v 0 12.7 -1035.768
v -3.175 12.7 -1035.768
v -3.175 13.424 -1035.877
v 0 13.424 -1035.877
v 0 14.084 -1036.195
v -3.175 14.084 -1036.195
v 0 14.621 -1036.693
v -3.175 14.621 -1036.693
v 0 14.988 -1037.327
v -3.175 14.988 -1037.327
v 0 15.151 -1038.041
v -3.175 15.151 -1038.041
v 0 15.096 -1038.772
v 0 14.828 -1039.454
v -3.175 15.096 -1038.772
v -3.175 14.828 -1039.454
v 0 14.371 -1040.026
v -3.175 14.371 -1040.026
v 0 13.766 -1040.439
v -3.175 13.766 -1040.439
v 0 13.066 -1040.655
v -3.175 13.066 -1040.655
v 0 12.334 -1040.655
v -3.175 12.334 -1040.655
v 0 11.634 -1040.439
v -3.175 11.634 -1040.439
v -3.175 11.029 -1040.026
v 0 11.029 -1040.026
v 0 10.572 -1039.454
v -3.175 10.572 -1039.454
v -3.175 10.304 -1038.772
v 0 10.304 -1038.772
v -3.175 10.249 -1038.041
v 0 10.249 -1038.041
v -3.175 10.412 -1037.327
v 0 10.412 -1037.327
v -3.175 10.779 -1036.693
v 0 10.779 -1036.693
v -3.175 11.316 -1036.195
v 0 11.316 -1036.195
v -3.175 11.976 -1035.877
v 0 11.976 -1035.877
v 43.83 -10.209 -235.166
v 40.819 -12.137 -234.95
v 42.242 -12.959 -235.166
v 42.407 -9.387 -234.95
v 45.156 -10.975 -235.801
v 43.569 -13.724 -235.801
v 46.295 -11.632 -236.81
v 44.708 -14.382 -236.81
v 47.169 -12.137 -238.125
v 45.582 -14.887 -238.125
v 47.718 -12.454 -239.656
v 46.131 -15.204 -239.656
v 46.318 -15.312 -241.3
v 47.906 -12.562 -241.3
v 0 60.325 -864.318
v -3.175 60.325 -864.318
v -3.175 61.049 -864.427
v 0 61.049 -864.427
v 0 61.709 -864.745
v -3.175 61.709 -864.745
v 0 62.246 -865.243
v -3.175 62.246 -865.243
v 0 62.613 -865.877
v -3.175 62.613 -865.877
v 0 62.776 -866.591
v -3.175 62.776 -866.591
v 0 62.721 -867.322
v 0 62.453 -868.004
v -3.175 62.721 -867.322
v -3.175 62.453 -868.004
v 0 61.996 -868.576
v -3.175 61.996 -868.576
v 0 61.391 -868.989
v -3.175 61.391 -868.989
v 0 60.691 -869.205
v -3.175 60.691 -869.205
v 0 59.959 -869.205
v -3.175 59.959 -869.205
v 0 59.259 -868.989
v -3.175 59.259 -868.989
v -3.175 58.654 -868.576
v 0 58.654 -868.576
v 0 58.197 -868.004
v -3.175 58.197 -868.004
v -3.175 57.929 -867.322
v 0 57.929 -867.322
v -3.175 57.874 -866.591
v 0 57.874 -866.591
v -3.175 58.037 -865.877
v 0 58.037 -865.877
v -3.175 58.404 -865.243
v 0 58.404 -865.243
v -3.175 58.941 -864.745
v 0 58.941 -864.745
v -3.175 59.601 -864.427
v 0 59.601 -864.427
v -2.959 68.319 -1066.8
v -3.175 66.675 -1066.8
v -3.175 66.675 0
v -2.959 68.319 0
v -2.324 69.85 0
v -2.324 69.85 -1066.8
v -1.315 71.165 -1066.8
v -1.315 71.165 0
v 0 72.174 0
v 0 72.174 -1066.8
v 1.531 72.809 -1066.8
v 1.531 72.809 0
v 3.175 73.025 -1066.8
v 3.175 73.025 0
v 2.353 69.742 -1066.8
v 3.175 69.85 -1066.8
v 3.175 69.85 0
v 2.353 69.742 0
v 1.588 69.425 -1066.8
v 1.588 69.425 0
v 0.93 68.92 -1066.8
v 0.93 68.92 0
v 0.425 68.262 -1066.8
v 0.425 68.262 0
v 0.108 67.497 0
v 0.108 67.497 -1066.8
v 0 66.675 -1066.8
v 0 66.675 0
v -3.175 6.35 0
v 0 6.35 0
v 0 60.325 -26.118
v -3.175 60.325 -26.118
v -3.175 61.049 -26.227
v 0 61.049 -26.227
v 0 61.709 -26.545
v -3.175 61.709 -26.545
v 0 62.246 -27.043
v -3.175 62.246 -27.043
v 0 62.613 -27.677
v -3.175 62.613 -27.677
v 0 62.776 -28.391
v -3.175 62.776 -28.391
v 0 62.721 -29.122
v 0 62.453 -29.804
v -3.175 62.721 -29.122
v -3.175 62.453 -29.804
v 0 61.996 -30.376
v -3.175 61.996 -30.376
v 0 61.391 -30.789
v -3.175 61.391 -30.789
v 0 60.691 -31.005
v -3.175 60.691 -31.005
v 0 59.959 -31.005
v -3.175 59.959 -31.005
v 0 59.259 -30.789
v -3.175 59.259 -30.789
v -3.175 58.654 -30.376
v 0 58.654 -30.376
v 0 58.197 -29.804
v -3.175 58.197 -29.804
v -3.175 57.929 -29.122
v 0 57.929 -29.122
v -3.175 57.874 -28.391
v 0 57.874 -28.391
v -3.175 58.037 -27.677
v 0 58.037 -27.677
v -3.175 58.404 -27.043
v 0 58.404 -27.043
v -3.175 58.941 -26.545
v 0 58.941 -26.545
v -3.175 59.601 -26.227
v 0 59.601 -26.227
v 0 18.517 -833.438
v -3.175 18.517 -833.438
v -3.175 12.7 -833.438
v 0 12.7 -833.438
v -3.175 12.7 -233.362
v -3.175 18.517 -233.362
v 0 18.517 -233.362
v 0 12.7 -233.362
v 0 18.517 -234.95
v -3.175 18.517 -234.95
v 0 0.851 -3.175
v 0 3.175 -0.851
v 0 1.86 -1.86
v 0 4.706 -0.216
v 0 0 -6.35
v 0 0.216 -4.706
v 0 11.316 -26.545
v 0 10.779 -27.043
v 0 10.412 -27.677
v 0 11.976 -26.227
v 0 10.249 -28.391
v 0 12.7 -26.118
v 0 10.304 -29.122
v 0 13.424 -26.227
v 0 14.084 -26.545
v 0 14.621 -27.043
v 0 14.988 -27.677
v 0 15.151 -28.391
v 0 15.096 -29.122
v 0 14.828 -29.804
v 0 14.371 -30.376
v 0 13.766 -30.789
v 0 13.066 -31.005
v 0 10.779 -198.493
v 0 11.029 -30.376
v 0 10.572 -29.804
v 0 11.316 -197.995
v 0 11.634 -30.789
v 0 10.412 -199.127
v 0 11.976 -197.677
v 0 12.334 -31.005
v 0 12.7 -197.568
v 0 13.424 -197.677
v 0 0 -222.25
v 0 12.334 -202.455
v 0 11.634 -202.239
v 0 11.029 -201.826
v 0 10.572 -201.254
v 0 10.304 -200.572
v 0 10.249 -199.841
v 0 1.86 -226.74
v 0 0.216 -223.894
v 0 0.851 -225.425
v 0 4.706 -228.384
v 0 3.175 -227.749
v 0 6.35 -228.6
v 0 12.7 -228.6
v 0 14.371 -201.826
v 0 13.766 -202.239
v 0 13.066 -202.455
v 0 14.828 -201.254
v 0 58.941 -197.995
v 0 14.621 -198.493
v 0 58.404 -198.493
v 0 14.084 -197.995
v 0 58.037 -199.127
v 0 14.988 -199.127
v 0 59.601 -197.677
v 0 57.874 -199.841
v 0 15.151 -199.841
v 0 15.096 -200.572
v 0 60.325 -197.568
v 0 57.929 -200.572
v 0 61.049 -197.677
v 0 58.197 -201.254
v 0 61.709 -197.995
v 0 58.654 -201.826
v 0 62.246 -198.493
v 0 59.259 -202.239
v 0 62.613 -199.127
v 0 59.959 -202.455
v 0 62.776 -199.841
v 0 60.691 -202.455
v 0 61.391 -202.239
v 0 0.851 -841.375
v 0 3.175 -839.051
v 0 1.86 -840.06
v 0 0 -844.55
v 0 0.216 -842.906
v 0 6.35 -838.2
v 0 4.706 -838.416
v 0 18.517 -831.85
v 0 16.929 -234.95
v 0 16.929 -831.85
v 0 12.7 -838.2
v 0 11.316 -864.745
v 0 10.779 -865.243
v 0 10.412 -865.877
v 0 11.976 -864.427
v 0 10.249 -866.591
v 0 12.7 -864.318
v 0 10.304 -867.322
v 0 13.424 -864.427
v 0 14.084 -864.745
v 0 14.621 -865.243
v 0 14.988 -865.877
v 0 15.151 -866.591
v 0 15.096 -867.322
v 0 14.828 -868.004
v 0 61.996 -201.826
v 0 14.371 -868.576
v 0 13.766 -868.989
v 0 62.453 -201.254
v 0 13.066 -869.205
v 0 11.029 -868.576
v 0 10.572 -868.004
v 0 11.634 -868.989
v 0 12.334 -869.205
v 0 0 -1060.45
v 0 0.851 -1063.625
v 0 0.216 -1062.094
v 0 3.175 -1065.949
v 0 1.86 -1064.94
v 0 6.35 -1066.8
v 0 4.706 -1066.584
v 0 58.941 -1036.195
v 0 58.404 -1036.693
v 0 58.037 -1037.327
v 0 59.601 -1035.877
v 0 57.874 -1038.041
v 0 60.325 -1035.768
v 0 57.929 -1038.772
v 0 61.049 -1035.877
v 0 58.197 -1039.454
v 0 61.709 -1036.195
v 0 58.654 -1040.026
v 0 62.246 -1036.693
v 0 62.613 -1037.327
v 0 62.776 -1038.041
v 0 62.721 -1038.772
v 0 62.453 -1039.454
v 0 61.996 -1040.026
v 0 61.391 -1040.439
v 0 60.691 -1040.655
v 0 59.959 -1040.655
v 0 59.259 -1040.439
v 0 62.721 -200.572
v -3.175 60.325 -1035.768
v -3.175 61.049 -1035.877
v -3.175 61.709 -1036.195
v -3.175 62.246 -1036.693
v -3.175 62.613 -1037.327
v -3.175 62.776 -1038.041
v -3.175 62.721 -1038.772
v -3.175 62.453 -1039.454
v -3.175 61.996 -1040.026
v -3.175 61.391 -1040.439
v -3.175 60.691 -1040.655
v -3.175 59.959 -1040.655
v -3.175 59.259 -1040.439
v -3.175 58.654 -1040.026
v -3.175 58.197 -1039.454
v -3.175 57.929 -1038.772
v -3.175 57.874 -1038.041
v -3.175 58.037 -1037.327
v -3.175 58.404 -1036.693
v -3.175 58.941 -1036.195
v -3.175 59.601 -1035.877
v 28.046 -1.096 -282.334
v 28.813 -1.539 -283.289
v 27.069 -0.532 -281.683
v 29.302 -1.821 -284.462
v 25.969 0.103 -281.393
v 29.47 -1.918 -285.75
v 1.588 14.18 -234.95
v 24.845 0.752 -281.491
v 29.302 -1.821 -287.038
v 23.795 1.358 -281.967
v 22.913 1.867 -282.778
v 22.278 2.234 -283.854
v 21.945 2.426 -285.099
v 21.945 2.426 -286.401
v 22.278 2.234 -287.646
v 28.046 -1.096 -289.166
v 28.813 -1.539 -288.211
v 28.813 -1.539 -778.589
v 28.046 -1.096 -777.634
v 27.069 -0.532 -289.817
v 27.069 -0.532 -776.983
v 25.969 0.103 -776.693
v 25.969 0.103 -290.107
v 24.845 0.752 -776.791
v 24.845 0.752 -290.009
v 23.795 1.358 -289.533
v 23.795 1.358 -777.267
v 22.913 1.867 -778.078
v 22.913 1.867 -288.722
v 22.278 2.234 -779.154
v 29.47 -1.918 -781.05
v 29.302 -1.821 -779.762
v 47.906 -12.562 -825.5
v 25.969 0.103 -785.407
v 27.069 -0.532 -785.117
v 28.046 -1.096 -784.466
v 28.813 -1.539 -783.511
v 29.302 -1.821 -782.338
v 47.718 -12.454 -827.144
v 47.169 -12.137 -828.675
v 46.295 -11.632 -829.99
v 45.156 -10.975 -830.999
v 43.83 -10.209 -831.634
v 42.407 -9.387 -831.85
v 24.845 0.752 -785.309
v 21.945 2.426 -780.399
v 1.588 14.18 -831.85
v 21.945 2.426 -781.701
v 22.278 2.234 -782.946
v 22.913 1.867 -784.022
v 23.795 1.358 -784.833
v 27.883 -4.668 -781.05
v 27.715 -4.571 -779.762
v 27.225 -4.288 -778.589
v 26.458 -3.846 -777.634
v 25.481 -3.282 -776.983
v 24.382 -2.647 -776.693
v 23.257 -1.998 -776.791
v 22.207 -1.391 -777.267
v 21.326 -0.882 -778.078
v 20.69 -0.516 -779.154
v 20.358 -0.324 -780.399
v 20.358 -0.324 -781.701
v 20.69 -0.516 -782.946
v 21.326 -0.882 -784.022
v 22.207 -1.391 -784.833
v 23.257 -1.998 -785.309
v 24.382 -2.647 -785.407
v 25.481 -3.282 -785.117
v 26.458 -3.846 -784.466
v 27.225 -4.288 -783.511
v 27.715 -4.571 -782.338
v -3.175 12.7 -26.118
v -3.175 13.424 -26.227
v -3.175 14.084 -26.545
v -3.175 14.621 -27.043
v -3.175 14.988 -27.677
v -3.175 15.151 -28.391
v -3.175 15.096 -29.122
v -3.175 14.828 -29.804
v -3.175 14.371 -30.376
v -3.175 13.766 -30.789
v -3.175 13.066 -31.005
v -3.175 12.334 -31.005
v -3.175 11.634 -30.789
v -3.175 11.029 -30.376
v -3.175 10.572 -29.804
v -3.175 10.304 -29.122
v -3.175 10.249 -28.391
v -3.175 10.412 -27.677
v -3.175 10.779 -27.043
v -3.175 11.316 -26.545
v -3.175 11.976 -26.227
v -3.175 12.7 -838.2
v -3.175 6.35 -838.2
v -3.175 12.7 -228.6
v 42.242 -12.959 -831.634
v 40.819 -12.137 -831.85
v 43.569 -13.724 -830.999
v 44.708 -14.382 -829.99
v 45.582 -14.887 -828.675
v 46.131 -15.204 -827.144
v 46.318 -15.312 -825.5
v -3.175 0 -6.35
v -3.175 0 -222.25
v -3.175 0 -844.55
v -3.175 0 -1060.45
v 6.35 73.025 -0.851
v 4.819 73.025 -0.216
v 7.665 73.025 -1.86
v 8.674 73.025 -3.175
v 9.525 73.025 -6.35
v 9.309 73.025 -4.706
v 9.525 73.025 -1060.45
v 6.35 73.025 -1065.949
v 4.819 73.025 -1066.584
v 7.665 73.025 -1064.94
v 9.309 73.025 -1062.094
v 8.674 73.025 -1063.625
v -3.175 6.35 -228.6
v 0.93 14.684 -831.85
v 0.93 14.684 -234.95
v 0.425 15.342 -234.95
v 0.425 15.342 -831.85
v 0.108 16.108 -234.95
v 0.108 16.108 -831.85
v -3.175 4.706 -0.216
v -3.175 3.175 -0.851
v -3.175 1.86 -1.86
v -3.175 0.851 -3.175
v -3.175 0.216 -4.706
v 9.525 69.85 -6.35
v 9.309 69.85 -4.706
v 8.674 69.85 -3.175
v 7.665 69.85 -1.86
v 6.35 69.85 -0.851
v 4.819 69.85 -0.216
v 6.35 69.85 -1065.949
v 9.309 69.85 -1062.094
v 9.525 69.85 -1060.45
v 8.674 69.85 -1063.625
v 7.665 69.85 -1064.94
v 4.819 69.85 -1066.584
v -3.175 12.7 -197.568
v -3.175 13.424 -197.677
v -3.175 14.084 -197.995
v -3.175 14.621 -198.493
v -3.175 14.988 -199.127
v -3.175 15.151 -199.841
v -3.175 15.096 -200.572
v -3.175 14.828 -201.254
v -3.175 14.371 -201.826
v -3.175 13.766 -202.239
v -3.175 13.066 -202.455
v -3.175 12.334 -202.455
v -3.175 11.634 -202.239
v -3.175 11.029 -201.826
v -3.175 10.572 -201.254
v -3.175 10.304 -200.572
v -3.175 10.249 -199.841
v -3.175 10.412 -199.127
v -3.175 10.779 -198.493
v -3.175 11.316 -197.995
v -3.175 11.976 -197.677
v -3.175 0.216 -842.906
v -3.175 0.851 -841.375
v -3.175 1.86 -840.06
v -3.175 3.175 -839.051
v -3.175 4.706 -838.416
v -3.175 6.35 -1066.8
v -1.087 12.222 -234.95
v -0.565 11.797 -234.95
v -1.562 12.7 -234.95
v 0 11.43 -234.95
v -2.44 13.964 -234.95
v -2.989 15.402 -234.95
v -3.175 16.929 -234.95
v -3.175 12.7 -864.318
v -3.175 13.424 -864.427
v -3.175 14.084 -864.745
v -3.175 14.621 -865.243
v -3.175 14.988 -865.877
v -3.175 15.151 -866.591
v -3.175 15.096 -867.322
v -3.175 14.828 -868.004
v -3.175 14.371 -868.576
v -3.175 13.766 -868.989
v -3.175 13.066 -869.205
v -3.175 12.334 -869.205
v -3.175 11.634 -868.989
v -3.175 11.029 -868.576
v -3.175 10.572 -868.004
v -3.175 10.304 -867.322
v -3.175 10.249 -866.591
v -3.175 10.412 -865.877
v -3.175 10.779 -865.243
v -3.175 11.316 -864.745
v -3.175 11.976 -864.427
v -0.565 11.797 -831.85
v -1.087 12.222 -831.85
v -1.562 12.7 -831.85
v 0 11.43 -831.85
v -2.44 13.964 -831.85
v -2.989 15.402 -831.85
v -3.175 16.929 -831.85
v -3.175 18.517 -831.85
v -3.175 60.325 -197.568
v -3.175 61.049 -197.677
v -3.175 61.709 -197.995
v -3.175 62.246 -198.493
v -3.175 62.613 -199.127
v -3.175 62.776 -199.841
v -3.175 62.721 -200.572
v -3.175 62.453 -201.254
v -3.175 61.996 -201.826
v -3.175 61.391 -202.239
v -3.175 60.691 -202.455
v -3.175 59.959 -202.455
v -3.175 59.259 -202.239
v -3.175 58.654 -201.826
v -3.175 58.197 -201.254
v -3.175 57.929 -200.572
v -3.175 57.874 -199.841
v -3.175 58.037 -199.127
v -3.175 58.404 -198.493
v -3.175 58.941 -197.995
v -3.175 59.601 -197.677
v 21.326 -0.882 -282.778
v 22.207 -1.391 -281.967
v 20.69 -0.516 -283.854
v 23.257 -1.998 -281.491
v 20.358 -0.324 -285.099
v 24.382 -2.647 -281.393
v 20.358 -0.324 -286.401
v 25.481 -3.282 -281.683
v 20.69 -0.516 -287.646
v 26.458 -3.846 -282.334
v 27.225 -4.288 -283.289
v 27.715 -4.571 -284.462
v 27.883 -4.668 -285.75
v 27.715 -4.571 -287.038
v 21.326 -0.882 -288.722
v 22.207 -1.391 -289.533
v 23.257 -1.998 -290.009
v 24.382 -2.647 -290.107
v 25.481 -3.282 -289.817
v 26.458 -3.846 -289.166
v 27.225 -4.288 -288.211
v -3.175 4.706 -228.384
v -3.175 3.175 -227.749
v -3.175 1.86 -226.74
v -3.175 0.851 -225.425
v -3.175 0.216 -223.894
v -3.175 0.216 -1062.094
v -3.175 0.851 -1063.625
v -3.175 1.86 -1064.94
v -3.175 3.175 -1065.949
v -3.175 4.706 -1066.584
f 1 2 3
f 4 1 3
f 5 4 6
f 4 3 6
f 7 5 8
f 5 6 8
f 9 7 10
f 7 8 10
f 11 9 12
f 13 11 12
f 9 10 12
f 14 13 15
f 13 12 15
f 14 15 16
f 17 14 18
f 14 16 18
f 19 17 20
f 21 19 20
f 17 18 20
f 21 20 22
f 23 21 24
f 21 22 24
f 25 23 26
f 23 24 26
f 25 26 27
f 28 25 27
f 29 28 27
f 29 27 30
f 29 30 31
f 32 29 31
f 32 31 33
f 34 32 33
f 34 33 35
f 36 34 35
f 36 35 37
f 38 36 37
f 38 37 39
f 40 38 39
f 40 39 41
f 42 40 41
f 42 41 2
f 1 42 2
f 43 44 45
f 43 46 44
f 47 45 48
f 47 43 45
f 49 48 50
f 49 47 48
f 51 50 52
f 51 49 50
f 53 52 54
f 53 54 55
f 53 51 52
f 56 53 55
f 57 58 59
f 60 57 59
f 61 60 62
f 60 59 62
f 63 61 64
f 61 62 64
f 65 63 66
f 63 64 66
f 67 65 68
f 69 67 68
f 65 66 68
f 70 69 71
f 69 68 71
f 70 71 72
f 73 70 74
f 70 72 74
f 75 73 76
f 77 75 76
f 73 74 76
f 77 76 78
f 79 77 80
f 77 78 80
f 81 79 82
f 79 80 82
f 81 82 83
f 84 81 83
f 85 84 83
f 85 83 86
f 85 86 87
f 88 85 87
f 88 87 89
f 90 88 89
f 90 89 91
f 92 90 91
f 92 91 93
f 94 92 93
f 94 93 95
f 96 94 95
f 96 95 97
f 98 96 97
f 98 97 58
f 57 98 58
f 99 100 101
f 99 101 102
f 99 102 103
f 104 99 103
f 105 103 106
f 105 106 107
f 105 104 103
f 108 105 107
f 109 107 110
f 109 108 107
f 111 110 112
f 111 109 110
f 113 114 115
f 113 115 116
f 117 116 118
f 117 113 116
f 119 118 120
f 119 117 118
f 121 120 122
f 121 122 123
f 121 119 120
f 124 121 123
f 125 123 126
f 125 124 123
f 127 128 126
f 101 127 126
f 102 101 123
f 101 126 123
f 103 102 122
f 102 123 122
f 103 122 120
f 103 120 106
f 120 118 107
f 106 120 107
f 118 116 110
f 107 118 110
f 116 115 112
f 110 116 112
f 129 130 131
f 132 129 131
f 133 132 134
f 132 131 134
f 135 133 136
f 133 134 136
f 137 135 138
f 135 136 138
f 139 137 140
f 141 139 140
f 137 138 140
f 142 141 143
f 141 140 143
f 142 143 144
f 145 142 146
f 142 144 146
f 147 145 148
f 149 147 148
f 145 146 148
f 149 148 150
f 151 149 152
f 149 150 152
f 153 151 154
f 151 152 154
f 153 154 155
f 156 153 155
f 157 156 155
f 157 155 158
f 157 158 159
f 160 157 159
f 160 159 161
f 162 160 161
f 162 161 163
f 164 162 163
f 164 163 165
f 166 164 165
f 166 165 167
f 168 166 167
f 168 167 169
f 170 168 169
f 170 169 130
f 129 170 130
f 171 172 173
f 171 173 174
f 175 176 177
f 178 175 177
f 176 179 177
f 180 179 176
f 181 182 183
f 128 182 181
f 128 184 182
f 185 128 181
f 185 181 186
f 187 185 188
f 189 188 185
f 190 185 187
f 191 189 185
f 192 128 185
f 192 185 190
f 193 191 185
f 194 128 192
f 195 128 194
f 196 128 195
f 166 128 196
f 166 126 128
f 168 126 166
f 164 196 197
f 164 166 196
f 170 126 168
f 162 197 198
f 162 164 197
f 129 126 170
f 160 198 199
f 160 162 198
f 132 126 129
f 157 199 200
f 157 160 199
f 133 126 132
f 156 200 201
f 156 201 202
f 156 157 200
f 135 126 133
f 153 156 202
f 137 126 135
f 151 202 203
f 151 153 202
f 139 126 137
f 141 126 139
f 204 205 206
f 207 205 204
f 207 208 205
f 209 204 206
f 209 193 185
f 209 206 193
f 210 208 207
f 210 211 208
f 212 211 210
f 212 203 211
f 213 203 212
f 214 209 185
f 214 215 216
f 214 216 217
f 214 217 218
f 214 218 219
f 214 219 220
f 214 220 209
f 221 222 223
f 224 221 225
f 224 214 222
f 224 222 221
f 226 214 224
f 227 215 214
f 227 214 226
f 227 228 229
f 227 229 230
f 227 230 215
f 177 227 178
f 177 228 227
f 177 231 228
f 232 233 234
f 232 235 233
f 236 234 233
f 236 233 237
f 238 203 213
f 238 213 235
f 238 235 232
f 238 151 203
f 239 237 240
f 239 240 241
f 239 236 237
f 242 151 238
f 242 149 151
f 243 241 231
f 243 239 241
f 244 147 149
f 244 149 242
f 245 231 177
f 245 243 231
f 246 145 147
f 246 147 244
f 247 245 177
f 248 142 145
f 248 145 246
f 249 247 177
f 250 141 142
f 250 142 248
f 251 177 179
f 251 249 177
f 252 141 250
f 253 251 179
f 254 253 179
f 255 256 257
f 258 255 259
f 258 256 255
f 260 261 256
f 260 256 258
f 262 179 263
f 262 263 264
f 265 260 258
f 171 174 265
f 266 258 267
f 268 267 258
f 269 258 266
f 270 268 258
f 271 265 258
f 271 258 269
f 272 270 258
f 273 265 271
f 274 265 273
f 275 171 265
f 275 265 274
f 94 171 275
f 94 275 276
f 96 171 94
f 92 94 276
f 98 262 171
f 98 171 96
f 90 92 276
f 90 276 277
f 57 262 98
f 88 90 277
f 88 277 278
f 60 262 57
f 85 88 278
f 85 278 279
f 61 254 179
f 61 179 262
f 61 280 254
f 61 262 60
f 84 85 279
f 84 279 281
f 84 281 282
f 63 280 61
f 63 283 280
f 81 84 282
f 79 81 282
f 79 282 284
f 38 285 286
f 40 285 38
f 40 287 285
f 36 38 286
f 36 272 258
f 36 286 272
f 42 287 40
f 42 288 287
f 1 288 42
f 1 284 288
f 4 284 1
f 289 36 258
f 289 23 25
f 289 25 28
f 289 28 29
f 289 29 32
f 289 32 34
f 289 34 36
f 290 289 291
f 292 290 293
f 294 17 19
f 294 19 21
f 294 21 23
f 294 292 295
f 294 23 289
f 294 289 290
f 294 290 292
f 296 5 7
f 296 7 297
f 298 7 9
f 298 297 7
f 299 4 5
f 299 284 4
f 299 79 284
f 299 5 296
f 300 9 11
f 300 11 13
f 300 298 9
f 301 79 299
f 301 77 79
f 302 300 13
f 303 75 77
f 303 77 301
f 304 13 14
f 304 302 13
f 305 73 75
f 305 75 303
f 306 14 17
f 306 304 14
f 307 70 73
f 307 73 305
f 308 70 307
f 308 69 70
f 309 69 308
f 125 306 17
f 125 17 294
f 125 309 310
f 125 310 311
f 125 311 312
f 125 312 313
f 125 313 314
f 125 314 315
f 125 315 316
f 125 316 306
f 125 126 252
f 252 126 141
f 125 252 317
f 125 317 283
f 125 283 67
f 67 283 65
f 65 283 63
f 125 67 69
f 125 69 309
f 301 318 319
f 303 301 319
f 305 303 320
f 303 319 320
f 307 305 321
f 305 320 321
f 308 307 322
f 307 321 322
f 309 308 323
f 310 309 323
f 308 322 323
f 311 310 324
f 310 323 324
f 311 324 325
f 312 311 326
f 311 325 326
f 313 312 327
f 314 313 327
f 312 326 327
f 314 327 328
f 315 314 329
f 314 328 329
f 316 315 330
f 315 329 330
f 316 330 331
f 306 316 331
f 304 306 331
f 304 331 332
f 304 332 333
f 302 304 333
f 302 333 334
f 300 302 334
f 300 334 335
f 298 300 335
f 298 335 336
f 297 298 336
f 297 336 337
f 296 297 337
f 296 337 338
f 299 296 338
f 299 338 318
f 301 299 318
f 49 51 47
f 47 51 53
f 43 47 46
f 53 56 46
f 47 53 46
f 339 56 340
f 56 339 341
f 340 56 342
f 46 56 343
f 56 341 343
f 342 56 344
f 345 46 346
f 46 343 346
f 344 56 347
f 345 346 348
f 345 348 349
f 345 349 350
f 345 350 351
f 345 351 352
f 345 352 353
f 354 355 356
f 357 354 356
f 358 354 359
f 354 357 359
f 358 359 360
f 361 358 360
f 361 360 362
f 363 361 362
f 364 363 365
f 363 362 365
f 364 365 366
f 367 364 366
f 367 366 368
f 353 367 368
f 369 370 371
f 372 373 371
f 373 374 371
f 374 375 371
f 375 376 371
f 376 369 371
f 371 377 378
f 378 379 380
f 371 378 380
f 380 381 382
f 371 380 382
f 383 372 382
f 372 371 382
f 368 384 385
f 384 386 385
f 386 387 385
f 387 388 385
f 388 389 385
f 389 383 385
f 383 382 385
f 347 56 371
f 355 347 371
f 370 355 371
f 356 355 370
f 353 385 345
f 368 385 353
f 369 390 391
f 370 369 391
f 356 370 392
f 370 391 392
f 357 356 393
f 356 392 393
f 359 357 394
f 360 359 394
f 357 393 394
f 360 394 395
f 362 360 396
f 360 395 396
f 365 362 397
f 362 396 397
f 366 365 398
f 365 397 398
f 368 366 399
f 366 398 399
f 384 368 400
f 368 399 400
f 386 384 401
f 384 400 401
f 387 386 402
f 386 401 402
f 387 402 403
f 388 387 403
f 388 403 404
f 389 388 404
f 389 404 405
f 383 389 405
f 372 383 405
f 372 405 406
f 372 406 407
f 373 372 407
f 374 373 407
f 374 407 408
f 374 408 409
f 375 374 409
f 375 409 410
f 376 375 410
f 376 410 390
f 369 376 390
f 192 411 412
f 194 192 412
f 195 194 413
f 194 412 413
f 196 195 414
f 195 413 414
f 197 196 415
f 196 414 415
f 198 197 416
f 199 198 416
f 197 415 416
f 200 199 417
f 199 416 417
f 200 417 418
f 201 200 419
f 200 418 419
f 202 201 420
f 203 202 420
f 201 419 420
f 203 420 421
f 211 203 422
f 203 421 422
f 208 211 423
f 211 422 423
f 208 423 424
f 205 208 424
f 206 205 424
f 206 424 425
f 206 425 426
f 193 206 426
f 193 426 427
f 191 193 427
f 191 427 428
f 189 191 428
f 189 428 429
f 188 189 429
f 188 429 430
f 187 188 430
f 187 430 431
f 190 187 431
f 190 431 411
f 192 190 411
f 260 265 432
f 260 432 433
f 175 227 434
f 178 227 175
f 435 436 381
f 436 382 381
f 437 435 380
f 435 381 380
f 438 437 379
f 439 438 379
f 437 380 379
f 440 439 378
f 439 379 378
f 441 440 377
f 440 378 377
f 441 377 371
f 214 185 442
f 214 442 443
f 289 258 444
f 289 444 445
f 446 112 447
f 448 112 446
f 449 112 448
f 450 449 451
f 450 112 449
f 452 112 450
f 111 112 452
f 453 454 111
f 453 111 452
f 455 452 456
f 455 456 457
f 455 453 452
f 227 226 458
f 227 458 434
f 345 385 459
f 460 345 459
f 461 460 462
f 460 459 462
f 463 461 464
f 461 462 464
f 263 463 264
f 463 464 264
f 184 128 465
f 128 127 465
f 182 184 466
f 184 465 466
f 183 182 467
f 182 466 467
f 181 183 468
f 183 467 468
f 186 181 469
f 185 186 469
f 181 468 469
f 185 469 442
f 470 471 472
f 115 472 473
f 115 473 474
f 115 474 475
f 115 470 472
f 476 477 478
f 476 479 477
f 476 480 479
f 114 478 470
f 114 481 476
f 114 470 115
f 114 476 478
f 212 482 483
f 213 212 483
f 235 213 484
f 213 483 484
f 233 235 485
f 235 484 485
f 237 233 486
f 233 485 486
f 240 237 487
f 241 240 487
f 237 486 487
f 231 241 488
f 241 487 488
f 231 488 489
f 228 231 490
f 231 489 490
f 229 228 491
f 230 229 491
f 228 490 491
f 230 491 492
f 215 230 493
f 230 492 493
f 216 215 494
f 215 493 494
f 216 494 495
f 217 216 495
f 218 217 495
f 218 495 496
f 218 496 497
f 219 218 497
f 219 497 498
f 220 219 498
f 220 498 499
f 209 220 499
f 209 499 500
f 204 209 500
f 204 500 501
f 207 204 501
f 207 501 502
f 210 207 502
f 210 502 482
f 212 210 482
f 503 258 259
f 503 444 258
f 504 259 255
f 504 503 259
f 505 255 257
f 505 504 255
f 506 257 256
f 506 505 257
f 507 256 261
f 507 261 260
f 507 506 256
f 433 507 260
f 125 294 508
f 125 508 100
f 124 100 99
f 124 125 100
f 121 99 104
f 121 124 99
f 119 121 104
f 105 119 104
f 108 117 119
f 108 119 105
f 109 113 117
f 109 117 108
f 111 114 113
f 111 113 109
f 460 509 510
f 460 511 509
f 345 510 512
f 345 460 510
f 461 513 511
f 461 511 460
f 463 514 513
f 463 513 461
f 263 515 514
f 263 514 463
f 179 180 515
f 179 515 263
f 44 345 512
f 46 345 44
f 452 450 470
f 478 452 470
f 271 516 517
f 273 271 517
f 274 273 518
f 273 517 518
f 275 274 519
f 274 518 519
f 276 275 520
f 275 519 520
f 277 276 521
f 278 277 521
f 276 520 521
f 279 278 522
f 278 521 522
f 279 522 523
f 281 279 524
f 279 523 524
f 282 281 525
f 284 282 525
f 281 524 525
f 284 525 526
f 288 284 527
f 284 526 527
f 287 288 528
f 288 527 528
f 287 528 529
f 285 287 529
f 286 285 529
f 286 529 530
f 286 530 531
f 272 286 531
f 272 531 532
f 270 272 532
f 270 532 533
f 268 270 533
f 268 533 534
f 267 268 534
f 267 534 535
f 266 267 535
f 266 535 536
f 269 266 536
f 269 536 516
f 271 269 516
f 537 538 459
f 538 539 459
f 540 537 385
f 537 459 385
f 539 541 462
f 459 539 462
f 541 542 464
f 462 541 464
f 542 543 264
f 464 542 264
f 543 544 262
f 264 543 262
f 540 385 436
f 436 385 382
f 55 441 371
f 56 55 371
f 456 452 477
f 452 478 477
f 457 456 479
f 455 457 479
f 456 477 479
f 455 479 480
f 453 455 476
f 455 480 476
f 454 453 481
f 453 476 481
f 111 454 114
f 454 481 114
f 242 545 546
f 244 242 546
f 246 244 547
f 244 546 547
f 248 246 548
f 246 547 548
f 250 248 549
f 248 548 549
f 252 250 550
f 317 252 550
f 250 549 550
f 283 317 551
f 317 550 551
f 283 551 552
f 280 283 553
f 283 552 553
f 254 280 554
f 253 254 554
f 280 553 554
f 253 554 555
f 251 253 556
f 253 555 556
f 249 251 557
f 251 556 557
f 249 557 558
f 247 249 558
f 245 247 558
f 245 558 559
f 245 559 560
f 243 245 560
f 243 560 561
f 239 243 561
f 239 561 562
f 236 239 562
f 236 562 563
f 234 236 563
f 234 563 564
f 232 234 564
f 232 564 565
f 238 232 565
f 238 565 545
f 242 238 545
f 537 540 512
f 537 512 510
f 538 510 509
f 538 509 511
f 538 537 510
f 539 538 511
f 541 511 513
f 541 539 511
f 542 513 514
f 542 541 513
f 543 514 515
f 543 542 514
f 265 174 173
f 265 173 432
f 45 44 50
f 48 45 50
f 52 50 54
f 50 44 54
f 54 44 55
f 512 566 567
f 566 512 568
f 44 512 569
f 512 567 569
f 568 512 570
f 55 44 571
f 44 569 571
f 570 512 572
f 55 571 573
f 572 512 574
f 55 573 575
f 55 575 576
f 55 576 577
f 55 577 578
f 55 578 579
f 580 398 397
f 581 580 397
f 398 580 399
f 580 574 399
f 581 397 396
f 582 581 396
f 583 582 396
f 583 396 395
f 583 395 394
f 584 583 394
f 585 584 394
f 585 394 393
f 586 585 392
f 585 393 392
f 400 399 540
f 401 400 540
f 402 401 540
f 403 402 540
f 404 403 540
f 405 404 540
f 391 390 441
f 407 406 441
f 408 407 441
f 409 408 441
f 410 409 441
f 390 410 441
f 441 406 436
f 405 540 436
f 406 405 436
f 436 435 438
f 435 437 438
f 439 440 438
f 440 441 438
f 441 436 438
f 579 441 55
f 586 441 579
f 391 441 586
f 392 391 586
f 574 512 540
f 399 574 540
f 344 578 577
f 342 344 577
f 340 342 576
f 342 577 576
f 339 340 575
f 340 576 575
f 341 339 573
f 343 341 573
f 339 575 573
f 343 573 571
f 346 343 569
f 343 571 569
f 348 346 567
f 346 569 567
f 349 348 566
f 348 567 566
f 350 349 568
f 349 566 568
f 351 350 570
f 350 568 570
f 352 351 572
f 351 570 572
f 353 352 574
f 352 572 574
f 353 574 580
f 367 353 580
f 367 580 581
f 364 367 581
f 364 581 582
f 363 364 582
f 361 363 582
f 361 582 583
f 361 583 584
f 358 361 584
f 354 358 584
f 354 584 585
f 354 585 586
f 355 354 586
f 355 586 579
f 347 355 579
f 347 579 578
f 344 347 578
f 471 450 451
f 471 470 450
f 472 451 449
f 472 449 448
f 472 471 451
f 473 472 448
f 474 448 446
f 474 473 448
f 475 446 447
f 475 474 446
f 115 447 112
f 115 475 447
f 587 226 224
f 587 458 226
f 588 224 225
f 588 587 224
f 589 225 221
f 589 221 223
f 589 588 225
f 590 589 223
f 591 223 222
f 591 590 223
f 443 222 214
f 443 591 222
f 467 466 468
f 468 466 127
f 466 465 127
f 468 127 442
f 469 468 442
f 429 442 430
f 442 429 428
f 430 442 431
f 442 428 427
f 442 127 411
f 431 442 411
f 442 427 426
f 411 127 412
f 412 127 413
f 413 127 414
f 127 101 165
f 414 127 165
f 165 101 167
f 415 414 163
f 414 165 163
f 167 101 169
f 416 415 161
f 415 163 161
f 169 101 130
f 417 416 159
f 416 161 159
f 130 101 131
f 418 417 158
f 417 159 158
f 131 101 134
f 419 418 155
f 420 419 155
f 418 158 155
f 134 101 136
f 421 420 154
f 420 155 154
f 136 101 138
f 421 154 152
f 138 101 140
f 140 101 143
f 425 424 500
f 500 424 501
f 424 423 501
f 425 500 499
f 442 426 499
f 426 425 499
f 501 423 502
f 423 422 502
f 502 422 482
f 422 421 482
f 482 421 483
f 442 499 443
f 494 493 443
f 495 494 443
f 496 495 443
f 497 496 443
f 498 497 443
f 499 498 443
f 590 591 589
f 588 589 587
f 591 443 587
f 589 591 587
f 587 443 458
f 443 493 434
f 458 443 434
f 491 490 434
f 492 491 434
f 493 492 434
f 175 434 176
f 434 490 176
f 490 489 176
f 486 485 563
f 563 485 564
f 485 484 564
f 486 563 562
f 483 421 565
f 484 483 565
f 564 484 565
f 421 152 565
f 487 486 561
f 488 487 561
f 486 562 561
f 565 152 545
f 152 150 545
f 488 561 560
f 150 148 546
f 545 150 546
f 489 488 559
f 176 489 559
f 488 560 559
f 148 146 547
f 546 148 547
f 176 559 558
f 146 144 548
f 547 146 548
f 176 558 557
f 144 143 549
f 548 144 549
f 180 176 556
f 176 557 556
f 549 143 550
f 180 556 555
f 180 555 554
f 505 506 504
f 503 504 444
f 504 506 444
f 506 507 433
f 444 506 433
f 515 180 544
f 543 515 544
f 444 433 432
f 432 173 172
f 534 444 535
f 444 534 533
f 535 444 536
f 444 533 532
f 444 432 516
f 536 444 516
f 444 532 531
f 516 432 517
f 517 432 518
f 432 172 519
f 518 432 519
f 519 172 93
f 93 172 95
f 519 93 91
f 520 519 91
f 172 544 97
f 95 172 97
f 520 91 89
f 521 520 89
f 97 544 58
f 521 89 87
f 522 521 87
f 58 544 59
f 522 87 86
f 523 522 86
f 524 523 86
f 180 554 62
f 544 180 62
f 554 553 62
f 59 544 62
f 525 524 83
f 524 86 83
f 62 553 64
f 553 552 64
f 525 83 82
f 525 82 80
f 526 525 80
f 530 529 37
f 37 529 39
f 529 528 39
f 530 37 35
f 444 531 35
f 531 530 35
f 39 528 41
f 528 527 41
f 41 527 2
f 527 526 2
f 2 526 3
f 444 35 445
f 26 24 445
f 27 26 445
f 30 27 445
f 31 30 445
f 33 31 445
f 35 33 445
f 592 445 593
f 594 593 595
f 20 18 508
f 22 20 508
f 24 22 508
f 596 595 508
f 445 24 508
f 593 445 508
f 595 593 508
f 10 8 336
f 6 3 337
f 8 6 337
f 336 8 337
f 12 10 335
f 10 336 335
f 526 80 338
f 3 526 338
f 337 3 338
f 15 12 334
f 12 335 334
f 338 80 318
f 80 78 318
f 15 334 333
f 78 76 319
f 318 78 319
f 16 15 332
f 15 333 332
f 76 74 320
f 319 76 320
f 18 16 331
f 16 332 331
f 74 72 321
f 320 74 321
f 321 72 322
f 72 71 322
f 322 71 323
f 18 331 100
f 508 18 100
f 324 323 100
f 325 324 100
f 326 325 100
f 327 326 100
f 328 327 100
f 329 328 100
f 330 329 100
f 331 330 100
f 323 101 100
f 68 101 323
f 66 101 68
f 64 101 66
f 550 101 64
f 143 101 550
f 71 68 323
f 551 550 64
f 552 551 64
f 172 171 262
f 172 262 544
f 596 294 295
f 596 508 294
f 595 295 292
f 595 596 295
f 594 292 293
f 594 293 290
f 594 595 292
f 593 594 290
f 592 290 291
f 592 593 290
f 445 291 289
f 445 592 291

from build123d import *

# Parameters (mm, degrees)
BASE_FLANGE1_DEPTH           = 3.175
EDGE_FLANGE1_START           = -833.4375
EDGE_FLANGE1_DEPTH           = 600.075
EDGE_FLANGE1_2_DEPTH         = 1.5875
EDGE_FLANGE1_START_2         = -234.95
EDGE_FLANGE1_3_DEPTH         = 1.5875
EDGE_FLANGE1_START_3         = -831.85
EDGE_FLANGE1_4_DEPTH         = 596.9
SKETCH10_R                   = 4.3688
CUT_EXTRUDE1_DEPTH           = 1070.608165207
SKETCH11_R                   = 2.45745
CUT_EXTRUDE2_DEPTH           = 1071.515830826
EDGE_FLANGE2_STRIP_W         = 19.05
EDGE_FLANGE2_STRIP_H         = 3.175
EDGE_FLANGE2_STRIP_CUT_DEPTH = 1066.8
EDGE_FLANGE2_DEPTH           = 1066.8
FILLET1_R                    = 6.35


# Read off the part's stored shape, not the designer's step: Edge-Flange1
# Sheet-metal steps are written as plain solids
with BuildPart() as part:
    # Sketch1 → Base-Flange1 (new body)
    with BuildSketch(Plane(origin=(0, 0, 0), x_dir=(0, 0, -1), z_dir=(1, 0, 0))):
        Polygon((838.2, 0), (1066.8, 0), (1066.8, 73.025), (0, 73.025), (0, 0), (228.6, 0), (228.6, 12.7), (234.95, 12.7), (234.95, 11.43), (831.85, 11.43), (831.85, 12.7), (838.2, 12.7), align=None)
    extrude(amount=-BASE_FLANGE1_DEPTH)

    # Edge-Flange1 outline → Edge-Flange1 (cut)
    with BuildSketch(Plane.XY.offset(EDGE_FLANGE1_START)):
        with BuildLine():
            Line((-3.175, 16.929261314), (-3.175, 11.43))
            Line((-3.175, 11.43), (0, 11.43))
            ThreePointArc((0, 11.43), (-2.324261314, 13.754261314), (-3.175, 16.929261314))
        make_face()
    extrude(amount=EDGE_FLANGE1_DEPTH, mode=Mode.SUBTRACT)

    # Edge-Flange1 2 outline → Edge-Flange1 2 (cut)
    with BuildSketch(Plane.XY.offset(EDGE_FLANGE1_START)):
        with BuildLine():
            Line((0, 18.516761314), (-3.175, 18.516761314))
            Line((-3.175, 18.516761314), (-3.175, 16.929261314))
            ThreePointArc((-3.175, 16.929261314), (-2.757968249, 14.665992052), (-1.561649527, 12.7))
            Line((-1.561649527, 12.7), (0, 12.7))
            Line((0, 12.7), (0, 18.516761314))
        make_face()
    extrude(amount=EDGE_FLANGE1_2_DEPTH, mode=Mode.SUBTRACT)

    # Edge-Flange1 3 outline → Edge-Flange1 3 (cut)
    with BuildSketch(Plane.XY.offset(EDGE_FLANGE1_START_2)):
        with BuildLine():
            Line((0, 18.516761314), (-3.175, 18.516761314))
            Line((-3.175, 18.516761314), (-3.175, 16.929261314))
            ThreePointArc((-3.175, 16.929261314), (-2.757968249, 14.665992052), (-1.561649527, 12.7))
            Line((-1.561649527, 12.7), (0, 12.7))
            Line((0, 12.7), (0, 18.516761314))
        make_face()
    extrude(amount=EDGE_FLANGE1_3_DEPTH, mode=Mode.SUBTRACT)

    # Edge-Flange1 4 outline → Edge-Flange1 4 (add)
    with BuildSketch(Plane.XY.offset(EDGE_FLANGE1_START_3)):
        with BuildLine():
            ThreePointArc((1.5875, 14.179630657), (0.425369343, 15.341761314), (0, 16.929261314))
            Line((0, 16.929261314), (0, 11.43))
            Line((0, 11.43), (46.318351826, -15.311912895))
            Line((46.318351826, -15.311912895), (47.905851826, -12.562282238))
            Line((47.905851826, -12.562282238), (1.5875, 14.179630657))
        make_face()
    extrude(amount=EDGE_FLANGE1_4_DEPTH)

    # Sketch10 → Cut-Extrude1 (cut, through all)
    with BuildSketch(Plane(origin=(4.949335183, 8.5725, 0), x_dir=(0.8660254037844364, -0.5000000000000041, 0), z_dir=(-0.500000000000004, -0.8660254037844363, 0))):
        with Locations((22.112285791, -285.75)):
            Circle(SKETCH10_R)
        with Locations((22.112285791, -781.05)):
            Circle(SKETCH10_R)
    extrude(amount=-CUT_EXTRUDE1_DEPTH, mode=Mode.SUBTRACT)

    # Sketch11 → Cut-Extrude2 (cut, through all)
    with BuildSketch(Plane.ZY.offset(3.175)):
        with Locations((-1038.225, 60.325)):
            Circle(SKETCH11_R)
        with Locations((-866.775, 60.325)):
            Circle(SKETCH11_R)
        with Locations((-1038.225, 12.7)):
            Circle(SKETCH11_R)
        with Locations((-866.775, 12.7)):
            Circle(SKETCH11_R)
        with Locations((-200.025, 60.325)):
            Circle(SKETCH11_R)
        with Locations((-200.025, 12.7)):
            Circle(SKETCH11_R)
        with Locations((-28.575, 12.7)):
            Circle(SKETCH11_R)
        with Locations((-28.575, 60.325)):
            Circle(SKETCH11_R)
    extrude(amount=-CUT_EXTRUDE2_DEPTH, mode=Mode.SUBTRACT)

    # Edge-Flange2 strip (across the edge) → Edge-Flange2 strip cut (cut)
    with BuildSketch(Plane(origin=(0, 73.025, -1066.8), x_dir=(0, -1, 0), z_dir=(0, 0, 1))):
        with Locations((-3.175, -1.5875)):
            Rectangle(EDGE_FLANGE2_STRIP_W, EDGE_FLANGE2_STRIP_H)
    extrude(amount=EDGE_FLANGE2_STRIP_CUT_DEPTH, mode=Mode.SUBTRACT)

    # Edge-Flange2 section (across the edge) → Edge-Flange2 (add)
    with BuildSketch(Plane(origin=(0, 73.025, -1066.8), x_dir=(0, -1, 0), z_dir=(0, 0, 1))):
        with BuildLine():
            Line((0, 3.175), (0, 9.525))
            Line((0, 9.525), (3.175, 9.525))
            Line((3.175, 9.525), (3.175, 3.175))
            ThreePointArc((3.175, 3.175), (4.10493597, 0.92993597), (6.35, 0))
            Line((6.35, 0), (6.35, -3.175))
            ThreePointArc((6.35, -3.175), (1.859871939, -1.315128061), (0, 3.175))
        make_face()
    extrude(amount=EDGE_FLANGE2_DEPTH)

    # Fillet1
    fillet1_edges = [part.edges().sort_by_distance(p)[0] for p in [
        (-1.5875, 0, 0),
        (47.112101826, -13.937097567, -234.95),
        (-1.5875, 0, -228.6),
        (47.112101826, -13.937097567, -831.85),
        (-1.5875, 0, -838.2),
        (-1.5875, 0, -1066.8),
        (9.525, 71.4375, 0),
        (9.525, 71.4375, -1066.8),
    ]]
    fillet(fillet1_edges, radius=FILLET1_R)


solid = part.part
